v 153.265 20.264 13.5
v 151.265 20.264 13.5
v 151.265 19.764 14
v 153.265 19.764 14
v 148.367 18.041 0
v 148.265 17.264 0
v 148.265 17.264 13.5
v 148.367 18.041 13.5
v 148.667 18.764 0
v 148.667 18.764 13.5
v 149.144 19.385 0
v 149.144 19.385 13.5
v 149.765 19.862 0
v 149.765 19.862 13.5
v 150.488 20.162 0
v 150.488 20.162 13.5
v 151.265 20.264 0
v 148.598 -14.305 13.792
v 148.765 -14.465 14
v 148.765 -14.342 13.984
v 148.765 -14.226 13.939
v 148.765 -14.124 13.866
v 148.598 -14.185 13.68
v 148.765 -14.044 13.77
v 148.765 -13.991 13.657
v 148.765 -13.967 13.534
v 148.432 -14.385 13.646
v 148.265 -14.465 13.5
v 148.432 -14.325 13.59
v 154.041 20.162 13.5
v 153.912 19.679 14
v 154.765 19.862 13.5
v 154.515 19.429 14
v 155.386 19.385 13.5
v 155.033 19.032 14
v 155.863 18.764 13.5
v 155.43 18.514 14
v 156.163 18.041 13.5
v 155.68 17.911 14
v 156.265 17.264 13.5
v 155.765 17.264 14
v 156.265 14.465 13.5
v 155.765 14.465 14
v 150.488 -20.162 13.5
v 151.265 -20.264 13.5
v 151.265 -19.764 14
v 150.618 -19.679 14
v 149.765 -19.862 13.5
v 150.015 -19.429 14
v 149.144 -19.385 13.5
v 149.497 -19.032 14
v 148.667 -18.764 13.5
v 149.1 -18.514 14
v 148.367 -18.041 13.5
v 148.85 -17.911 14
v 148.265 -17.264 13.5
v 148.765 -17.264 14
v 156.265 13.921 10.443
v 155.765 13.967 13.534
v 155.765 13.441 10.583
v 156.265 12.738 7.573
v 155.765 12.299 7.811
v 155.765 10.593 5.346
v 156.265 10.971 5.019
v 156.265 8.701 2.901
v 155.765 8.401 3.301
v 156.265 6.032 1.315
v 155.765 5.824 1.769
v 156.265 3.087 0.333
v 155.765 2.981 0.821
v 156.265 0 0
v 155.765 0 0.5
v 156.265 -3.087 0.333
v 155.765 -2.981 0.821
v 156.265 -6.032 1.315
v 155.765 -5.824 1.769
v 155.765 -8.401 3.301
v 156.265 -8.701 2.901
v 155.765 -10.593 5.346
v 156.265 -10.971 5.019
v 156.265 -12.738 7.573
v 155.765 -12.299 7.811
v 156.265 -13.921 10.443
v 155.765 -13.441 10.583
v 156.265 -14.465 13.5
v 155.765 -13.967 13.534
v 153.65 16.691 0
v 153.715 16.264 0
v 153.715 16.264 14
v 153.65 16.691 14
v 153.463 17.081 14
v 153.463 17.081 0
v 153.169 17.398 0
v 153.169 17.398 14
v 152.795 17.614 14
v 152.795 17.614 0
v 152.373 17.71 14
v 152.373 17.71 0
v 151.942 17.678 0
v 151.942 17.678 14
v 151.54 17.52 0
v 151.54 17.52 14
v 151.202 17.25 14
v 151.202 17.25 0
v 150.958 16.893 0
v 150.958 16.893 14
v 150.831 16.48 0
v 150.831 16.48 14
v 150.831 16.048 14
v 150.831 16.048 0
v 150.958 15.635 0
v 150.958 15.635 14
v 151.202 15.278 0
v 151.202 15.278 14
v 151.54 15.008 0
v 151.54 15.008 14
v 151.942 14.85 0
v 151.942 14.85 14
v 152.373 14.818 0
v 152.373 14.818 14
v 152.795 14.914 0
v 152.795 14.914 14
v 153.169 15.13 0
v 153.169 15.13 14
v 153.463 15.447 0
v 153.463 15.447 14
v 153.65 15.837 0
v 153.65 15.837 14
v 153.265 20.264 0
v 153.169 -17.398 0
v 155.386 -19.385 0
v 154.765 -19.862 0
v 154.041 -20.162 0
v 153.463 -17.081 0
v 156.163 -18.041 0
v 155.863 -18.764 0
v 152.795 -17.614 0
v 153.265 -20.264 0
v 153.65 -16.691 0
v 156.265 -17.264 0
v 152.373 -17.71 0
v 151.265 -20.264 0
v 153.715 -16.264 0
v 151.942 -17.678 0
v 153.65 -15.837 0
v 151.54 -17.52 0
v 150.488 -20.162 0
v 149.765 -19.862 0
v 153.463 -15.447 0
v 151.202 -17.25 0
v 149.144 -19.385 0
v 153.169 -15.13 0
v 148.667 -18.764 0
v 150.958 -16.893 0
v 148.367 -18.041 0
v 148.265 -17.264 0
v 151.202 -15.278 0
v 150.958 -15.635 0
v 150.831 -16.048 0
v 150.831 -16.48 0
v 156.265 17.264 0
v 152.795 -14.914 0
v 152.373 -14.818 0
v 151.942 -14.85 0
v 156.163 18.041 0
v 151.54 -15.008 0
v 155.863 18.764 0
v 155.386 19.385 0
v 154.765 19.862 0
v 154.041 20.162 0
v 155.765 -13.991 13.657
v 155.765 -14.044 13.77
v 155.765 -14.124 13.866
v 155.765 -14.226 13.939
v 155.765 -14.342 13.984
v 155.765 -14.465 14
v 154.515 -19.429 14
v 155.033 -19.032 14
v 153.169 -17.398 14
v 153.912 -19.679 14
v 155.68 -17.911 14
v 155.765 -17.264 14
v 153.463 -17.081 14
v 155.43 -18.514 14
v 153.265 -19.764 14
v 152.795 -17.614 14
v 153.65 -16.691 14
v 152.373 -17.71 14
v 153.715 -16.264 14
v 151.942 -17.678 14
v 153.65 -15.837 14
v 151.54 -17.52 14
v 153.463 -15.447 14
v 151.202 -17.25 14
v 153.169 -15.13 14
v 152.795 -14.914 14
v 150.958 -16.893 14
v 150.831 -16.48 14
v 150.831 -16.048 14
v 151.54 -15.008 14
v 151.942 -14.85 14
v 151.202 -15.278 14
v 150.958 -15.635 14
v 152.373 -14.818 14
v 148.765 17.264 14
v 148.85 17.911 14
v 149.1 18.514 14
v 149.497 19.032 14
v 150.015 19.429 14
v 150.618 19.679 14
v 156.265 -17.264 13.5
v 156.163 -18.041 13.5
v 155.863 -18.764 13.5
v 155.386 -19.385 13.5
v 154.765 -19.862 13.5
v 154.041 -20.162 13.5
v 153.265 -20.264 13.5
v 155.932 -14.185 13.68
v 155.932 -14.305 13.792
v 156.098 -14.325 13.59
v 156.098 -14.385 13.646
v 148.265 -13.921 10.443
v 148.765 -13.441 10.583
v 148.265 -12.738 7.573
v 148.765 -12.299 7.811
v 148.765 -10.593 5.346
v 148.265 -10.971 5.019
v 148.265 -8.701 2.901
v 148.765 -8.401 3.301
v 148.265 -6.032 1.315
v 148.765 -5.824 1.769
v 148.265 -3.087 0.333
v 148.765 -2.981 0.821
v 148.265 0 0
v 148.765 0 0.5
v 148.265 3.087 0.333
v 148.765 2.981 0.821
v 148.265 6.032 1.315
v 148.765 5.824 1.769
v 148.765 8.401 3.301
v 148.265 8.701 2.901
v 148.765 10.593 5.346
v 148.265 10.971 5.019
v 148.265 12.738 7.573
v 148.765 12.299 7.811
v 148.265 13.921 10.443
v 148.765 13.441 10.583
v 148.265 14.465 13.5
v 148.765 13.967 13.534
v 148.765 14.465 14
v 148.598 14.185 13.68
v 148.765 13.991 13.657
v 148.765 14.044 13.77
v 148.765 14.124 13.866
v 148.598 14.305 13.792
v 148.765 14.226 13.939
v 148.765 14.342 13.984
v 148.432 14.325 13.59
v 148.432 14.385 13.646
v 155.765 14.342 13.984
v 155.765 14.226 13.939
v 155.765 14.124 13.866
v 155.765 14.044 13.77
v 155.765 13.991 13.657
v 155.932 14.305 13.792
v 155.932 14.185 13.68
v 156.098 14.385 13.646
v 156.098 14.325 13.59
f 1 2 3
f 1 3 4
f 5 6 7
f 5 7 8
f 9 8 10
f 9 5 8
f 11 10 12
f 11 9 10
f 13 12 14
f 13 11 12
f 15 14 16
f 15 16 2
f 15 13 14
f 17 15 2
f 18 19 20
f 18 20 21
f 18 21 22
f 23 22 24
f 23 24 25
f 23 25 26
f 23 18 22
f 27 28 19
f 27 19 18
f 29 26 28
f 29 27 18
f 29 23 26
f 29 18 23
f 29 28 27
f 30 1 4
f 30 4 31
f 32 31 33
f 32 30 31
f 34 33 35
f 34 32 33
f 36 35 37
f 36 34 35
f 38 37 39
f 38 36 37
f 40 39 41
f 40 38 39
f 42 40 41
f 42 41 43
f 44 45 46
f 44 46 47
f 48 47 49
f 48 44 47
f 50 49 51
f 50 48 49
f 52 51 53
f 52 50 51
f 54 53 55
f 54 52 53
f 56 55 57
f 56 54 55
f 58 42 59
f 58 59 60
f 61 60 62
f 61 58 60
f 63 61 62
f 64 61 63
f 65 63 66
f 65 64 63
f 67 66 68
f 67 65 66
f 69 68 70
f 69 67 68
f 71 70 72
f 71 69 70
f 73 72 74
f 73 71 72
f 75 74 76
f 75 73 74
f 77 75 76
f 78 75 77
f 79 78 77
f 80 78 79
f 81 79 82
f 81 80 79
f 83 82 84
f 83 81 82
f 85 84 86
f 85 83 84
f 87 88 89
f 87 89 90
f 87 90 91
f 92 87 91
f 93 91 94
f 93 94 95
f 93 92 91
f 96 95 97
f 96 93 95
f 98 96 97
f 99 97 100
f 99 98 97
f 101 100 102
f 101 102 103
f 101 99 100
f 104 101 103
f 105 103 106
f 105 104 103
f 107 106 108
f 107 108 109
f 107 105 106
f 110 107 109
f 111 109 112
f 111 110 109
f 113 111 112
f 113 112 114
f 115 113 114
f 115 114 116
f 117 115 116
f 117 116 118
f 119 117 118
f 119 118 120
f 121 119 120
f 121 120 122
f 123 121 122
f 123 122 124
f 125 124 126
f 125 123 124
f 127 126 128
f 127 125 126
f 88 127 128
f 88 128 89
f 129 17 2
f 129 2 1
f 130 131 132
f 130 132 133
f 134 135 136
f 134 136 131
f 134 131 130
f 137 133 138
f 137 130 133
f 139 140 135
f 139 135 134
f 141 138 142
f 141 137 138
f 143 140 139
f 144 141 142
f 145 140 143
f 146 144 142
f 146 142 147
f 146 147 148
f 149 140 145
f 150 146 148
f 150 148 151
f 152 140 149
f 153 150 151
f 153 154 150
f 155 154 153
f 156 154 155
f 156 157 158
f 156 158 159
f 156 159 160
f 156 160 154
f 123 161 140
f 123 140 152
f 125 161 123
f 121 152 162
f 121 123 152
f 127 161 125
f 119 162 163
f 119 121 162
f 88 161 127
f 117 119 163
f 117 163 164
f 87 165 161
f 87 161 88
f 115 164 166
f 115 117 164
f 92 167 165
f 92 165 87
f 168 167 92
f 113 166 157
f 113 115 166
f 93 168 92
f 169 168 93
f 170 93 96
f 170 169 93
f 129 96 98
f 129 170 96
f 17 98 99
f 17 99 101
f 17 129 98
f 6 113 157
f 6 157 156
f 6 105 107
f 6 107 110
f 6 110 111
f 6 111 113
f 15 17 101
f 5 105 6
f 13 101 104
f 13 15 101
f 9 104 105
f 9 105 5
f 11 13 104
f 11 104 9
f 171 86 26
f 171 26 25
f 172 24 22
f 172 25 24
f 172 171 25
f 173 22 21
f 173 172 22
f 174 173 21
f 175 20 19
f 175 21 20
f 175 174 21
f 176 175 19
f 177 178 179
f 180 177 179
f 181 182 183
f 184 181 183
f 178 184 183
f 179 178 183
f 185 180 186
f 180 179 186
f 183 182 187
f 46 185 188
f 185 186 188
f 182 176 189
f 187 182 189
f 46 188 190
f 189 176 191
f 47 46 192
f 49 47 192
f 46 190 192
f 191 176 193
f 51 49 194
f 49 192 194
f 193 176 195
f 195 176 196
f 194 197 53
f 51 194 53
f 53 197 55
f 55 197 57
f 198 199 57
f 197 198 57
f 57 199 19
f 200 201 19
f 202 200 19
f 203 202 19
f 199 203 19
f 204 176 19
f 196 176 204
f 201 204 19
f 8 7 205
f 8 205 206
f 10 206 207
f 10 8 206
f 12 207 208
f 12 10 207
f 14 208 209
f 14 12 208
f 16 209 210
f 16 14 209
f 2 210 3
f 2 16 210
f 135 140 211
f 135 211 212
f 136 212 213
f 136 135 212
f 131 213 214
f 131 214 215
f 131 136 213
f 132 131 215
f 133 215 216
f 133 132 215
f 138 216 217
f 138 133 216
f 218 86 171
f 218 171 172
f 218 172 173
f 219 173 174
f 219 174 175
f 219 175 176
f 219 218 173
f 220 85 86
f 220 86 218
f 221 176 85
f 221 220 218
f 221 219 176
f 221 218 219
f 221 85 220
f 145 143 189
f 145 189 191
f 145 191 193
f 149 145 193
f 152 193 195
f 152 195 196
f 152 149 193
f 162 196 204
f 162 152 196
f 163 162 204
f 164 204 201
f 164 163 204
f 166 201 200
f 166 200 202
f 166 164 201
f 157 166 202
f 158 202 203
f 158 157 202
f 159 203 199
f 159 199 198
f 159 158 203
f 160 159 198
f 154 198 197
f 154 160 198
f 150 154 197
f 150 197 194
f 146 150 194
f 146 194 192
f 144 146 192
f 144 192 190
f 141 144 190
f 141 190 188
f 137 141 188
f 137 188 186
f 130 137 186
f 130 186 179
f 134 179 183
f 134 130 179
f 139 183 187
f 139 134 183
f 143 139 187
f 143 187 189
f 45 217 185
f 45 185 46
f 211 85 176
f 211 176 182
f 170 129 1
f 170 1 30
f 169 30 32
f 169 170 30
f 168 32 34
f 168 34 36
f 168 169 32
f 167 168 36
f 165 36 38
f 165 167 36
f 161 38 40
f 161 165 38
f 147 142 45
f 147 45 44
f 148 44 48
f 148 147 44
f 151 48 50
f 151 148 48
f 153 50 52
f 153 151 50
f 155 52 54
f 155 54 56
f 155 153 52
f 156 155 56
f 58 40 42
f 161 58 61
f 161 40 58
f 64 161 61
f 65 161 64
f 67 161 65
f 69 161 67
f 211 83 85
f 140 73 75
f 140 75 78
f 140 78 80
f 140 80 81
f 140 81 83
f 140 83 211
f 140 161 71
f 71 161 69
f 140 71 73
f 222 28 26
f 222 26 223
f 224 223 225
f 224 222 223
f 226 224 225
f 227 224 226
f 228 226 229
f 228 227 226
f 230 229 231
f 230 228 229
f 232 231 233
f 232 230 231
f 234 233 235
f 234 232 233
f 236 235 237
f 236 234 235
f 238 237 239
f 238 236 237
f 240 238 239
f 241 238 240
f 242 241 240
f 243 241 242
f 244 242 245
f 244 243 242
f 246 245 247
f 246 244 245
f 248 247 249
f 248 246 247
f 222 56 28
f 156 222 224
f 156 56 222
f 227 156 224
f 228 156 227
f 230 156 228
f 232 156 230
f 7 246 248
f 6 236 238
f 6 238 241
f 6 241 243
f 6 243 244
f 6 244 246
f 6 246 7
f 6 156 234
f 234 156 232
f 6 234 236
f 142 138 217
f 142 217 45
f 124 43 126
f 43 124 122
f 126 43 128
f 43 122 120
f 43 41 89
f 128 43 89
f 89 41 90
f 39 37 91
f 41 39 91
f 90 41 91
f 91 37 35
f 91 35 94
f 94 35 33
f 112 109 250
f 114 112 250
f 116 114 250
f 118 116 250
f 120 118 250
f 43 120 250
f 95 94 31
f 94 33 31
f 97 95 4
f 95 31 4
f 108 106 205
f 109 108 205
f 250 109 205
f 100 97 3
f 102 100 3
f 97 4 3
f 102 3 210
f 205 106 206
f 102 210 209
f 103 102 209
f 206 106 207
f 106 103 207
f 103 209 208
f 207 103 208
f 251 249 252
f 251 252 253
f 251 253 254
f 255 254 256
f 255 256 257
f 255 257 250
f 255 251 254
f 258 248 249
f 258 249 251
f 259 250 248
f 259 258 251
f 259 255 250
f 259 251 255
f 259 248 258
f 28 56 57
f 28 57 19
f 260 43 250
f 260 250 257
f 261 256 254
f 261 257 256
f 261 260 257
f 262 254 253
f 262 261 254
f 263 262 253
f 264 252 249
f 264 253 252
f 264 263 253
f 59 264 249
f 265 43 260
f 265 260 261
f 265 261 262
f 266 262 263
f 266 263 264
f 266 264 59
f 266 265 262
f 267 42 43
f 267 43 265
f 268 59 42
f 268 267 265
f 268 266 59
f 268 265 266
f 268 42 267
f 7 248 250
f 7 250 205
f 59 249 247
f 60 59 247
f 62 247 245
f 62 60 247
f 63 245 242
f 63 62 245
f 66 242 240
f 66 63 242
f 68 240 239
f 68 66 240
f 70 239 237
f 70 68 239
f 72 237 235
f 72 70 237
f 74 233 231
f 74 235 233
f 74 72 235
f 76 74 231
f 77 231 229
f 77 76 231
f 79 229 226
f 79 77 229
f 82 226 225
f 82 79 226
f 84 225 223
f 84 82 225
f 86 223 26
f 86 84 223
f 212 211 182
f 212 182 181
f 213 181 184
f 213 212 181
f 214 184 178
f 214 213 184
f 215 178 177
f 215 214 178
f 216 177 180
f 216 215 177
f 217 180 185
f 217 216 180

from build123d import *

# Parameters (mm, degrees)
SKETCH_1_R               = 1.45
EXTRUDE_1_DEPTH          = 14
CUT_EXTRUDE_1_DEPTH      = 26.896554891
CUT_EXTRUDE_1_DEPTH_BACK = 26.896554891
SKETCH_2_R               = 14
FILLET_1_R               = 0.5
CHAMFER_1_SIZE           = 0.5


with BuildPart() as part:
    # 草图1 → 凸台-拉伸1 (new body)
    with BuildSketch(Plane.XY):
        with BuildLine():
            Line((151.264880132, 20.264045876), (153.264880132, 20.264045876))
            ThreePointArc((153.264880132, 20.264045876), (155.386200475, 19.385366219), (156.264880132, 17.264045876))
            Line((156.264880132, 17.264045876), (156.264880132, -17.264045876))
            ThreePointArc((156.264880132, -17.264045876), (155.386200475, -19.385366219), (153.264880132, -20.264045876))
            Line((153.264880132, -20.264045876), (151.264880132, -20.264045876))
            ThreePointArc((151.264880132, -20.264045876), (149.143559788, -19.385366219), (148.264880132, -17.264045876))
            Line((148.264880132, -17.264045876), (148.264880132, 17.264045876))
            ThreePointArc((148.264880132, 17.264045876), (149.143559788, 19.385366219), (151.264880132, 20.264045876))
        make_face()
        with Locations((152.264880132, 16.264045876)):
            Circle(SKETCH_1_R, mode=Mode.SUBTRACT)
        with Locations((152.264880132, -16.264045876)):
            Circle(SKETCH_1_R, mode=Mode.SUBTRACT)
    extrude(amount=EXTRUDE_1_DEPTH)

    # 草图2 → 切除-拉伸1 (cut, two sides: drawn at the far end of the back side and taken through both)
    with BuildSketch(Plane.ZY.offset(-148.264880132).offset(-CUT_EXTRUDE_1_DEPTH_BACK)):
        with Locations((14.5, 0)):
            Circle(SKETCH_2_R)
    extrude(amount=CUT_EXTRUDE_1_DEPTH + CUT_EXTRUDE_1_DEPTH_BACK, mode=Mode.SUBTRACT)

    # 圆角1
    fillet_1_edges = [part.edges().sort_by_distance(p)[0] for p in [
        (152.264880132, 13.99106858, 14),
        (152.264880132, -13.99106858, 14),
    ]]
    fillet(fillet_1_edges, radius=FILLET_1_R)

    # 倒角1
    chamfer_1_edges = [part.edges().sort_by_distance(p)[0] for p in [
        (155.386200475, 19.385366219, 14),
        (152.264880132, 20.264045876, 14),
        (149.143559788, 19.385366219, 14),
        (148.264880132, 15.864761009, 14),
        (149.143559788, -19.385366219, 14),
        (152.264880132, -20.264045876, 14),
        (148.264880132, 0, 0.5),
        (156.264880132, 0, 0.5),
        (156.264880132, 15.864761009, 14),
        (156.264880132, 14.124332022, 13.865541639),
        (156.264880132, -14.124332022, 13.865541639),
        (148.264880132, -15.864761009, 14),
        (148.264880132, 14.124332022, 13.865541639),
        (148.264880132, -14.124332022, 13.865541639),
        (155.386200475, -19.385366219, 14),
        (156.264880132, -15.864761009, 14),
    ]]
    chamfer(chamfer_1_edges, length=CHAMFER_1_SIZE - 0.0001)  # a hair under: the kernel refuses the full size


solid = part.part
